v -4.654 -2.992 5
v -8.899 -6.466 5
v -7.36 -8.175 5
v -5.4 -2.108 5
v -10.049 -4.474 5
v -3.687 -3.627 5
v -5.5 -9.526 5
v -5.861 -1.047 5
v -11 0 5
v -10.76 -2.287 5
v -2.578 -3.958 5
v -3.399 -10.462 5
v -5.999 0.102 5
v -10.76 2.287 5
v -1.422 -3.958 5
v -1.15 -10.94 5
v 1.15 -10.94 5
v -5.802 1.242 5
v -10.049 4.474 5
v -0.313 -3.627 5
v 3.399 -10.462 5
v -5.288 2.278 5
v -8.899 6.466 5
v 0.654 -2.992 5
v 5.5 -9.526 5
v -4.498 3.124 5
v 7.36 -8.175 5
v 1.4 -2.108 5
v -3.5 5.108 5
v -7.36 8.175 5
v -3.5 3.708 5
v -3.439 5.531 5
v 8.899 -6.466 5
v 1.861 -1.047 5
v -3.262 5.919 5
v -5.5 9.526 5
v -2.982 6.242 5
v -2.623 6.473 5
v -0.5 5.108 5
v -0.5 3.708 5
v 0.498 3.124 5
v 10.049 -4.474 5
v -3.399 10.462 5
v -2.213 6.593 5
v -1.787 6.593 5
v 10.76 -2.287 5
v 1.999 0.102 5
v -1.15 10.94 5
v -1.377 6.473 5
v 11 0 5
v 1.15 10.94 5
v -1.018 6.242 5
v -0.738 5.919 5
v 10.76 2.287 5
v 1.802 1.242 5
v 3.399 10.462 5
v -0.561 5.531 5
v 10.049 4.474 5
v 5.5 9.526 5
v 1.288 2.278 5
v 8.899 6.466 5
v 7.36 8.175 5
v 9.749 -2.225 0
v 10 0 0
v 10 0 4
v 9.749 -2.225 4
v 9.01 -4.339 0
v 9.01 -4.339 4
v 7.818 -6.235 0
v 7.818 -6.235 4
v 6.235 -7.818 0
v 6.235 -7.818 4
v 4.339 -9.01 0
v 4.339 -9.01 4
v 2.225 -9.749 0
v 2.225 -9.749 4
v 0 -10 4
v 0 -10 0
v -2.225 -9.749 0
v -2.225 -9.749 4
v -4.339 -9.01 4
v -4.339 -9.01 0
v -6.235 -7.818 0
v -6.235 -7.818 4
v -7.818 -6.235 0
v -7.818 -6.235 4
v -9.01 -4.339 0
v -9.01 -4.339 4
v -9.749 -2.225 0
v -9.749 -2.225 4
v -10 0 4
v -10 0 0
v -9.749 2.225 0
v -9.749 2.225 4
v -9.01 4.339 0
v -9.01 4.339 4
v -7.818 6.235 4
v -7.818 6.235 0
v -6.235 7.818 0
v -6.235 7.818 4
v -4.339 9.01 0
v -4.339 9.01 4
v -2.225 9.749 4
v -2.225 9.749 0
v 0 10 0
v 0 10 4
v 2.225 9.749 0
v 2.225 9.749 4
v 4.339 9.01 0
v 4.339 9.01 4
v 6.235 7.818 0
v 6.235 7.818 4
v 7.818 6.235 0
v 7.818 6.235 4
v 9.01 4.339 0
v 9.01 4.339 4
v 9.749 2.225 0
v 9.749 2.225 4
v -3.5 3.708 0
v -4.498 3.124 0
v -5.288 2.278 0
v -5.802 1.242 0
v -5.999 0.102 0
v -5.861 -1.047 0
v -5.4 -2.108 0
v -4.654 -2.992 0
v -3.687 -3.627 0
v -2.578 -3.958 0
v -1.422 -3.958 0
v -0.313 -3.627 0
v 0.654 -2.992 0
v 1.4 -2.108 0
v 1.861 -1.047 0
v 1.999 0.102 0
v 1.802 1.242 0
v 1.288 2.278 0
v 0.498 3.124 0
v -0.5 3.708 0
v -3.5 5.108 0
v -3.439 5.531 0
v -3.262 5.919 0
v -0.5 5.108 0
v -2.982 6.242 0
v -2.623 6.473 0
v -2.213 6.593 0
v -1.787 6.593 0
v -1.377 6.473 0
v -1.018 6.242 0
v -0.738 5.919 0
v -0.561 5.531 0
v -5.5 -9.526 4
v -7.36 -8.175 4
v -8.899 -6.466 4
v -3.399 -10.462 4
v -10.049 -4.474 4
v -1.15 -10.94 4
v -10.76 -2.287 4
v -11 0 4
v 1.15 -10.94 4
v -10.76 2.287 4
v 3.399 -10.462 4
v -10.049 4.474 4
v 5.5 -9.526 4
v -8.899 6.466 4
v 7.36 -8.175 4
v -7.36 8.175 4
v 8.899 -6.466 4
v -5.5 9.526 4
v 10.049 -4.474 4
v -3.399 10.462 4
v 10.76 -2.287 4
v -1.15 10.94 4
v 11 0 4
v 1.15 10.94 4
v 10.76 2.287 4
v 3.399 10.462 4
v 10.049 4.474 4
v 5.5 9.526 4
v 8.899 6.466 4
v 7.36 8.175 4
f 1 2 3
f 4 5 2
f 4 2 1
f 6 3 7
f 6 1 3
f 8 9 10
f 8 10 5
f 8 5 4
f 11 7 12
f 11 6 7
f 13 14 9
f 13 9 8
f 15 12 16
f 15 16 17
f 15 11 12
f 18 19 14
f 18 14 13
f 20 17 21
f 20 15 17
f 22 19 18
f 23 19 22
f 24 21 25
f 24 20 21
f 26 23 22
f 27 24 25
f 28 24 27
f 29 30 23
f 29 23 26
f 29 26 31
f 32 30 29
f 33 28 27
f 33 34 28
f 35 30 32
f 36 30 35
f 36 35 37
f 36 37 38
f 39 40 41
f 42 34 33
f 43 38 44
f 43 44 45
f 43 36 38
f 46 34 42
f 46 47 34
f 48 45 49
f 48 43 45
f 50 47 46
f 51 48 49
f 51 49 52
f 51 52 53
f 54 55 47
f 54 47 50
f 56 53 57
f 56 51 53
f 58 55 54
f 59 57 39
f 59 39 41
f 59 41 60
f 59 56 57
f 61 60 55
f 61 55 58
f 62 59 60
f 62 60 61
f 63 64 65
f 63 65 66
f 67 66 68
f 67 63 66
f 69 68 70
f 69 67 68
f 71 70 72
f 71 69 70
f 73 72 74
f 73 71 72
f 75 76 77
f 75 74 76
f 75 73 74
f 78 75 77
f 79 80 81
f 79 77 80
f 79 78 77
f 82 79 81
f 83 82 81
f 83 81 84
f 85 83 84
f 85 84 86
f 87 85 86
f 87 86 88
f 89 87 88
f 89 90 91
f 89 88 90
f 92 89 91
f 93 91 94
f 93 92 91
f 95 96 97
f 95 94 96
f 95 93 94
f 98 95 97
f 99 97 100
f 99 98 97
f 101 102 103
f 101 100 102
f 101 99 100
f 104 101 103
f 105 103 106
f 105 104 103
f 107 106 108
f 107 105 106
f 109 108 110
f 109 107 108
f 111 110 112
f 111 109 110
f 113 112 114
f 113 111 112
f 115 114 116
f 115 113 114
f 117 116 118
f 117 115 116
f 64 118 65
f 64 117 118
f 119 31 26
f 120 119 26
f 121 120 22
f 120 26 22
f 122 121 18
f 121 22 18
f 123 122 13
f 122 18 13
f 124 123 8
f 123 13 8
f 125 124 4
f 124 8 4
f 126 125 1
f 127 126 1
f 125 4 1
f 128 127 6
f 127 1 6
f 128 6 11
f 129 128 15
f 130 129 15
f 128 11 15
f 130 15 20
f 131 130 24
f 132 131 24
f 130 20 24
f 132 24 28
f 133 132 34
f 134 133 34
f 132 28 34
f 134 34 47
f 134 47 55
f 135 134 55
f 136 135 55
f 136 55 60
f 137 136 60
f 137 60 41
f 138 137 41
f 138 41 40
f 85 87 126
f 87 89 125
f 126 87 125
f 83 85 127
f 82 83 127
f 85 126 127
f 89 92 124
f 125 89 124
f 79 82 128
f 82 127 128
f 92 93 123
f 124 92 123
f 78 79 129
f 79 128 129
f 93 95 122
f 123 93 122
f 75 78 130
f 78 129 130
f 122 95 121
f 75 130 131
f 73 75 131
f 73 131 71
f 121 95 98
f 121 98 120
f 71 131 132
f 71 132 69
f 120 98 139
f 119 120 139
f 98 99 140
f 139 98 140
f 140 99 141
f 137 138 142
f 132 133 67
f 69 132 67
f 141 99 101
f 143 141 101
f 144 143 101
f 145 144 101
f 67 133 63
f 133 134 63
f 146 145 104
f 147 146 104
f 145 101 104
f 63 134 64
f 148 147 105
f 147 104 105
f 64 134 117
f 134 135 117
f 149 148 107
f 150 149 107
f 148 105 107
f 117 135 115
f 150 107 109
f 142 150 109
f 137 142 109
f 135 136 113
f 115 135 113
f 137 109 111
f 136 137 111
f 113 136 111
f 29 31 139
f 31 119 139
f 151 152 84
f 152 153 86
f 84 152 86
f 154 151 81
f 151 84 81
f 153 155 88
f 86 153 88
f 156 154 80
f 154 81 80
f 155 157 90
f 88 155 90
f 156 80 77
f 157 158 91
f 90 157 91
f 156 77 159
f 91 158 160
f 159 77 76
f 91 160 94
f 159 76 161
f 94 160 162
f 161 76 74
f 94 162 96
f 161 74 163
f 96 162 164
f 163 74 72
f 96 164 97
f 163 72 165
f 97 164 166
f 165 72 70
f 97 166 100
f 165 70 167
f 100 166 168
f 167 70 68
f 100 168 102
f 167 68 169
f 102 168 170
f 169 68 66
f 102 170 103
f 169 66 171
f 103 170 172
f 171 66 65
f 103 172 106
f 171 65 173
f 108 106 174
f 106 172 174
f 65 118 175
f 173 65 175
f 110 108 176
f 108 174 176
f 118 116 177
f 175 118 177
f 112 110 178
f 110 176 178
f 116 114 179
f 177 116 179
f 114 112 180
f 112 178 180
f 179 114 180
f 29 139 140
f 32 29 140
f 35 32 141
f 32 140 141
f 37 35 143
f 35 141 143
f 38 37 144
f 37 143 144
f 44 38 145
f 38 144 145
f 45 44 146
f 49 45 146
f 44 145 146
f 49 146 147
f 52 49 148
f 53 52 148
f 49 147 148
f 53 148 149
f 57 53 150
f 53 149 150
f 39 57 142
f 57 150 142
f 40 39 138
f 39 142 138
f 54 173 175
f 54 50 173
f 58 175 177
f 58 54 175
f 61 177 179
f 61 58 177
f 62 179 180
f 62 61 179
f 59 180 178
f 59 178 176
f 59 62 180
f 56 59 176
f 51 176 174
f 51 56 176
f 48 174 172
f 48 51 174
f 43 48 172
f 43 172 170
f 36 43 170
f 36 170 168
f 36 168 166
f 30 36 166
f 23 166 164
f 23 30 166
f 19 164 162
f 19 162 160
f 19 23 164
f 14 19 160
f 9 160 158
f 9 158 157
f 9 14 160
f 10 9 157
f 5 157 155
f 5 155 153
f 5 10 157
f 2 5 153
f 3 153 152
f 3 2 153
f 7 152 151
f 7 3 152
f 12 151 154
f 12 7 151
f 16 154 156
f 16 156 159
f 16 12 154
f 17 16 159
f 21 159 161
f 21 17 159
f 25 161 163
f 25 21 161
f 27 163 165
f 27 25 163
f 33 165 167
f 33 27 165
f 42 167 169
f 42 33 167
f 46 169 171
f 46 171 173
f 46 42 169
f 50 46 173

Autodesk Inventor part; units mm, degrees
ref_plane "YZ Plane" through (0, 0, 0) normal (1, 0, 0) x (0, 1, 0)
ref_plane "XZ Plane" through (0, 0, 0) normal (0, 1, 0) x (-1, 0, 0)
ref_plane "XY Plane" through (0, 0, 0) normal (0, 0, 1) x (1, 0, 0)
sketch "スケッチ1" plane through (0, 0, 0) normal (0, 0, 1) x (1, 0, 0)
  circle A0 centre (0, 0) radius 10
  dimension "d0" = 20
extrude "押し出し1" add sketch "スケッチ1" along normal blind 5
sketch "スケッチ2" plane through (0, 0, 5) normal (0, 0, 1) x (1, 0, 0)
  circle A0 centre (0, 0) radius 10 projected
  circle A1 centre (0, 0) radius 11
  circle A2 centre (0, 0) radius 10 projected
  dimension "d3" = 22
extrude "押し出し2" add sketch "スケッチ2" against normal blind 1
sketch "スケッチ3" plane through (0, 0, 0) normal (0, 0, -1) x (-1, 0, 0)
  point P0 (0, 0)
  point P1 (2, 0)
  dimension "d6" = 2
hole "穴1" at (-2, 0, 0) direction (0, 0, 1) diameter 8 end through all
sketch "スケッチ4" plane through (0, 0, 0) normal (0, 0, -1) x (-1, 0, 0)
  circle A0 centre (2, 0) radius 4 projected
  line L0 (0.5, 3.7081) -> (3.5, 3.7081)
  line L1 (3.5, 3.7081) -> (3.5, 5.1081)
  line L2 (3.5, 5.1081) -> (0.5, 5.1081)
  line L3 (0.5, 5.1081) -> (0.5, 3.7081)
  circle A1 centre (2, 5.1081) radius 1.5
  point P0 (0, 0)
  point P1 (0.5, 5.1081)
  dimension "d14" = 3
  dimension "d15" = 1.4
extrude "押し出し3" cut sketch "スケッチ4" against normal through all contours L0 A1 A0 | A0 A1 L1 | L3 A1 A0 | A0 A1 L0 | A1 L0 A0 | A0 A1 L2 | L2 A1 picked at (3.1128, 3.733) picked at (0.8872, 3.733) picked at (2.0995, 3.8017)
equation "\"d6\" = r"
equation "\"r\" = 2"
properties part number "偏心軸板" material "アルミニウム 6061"
